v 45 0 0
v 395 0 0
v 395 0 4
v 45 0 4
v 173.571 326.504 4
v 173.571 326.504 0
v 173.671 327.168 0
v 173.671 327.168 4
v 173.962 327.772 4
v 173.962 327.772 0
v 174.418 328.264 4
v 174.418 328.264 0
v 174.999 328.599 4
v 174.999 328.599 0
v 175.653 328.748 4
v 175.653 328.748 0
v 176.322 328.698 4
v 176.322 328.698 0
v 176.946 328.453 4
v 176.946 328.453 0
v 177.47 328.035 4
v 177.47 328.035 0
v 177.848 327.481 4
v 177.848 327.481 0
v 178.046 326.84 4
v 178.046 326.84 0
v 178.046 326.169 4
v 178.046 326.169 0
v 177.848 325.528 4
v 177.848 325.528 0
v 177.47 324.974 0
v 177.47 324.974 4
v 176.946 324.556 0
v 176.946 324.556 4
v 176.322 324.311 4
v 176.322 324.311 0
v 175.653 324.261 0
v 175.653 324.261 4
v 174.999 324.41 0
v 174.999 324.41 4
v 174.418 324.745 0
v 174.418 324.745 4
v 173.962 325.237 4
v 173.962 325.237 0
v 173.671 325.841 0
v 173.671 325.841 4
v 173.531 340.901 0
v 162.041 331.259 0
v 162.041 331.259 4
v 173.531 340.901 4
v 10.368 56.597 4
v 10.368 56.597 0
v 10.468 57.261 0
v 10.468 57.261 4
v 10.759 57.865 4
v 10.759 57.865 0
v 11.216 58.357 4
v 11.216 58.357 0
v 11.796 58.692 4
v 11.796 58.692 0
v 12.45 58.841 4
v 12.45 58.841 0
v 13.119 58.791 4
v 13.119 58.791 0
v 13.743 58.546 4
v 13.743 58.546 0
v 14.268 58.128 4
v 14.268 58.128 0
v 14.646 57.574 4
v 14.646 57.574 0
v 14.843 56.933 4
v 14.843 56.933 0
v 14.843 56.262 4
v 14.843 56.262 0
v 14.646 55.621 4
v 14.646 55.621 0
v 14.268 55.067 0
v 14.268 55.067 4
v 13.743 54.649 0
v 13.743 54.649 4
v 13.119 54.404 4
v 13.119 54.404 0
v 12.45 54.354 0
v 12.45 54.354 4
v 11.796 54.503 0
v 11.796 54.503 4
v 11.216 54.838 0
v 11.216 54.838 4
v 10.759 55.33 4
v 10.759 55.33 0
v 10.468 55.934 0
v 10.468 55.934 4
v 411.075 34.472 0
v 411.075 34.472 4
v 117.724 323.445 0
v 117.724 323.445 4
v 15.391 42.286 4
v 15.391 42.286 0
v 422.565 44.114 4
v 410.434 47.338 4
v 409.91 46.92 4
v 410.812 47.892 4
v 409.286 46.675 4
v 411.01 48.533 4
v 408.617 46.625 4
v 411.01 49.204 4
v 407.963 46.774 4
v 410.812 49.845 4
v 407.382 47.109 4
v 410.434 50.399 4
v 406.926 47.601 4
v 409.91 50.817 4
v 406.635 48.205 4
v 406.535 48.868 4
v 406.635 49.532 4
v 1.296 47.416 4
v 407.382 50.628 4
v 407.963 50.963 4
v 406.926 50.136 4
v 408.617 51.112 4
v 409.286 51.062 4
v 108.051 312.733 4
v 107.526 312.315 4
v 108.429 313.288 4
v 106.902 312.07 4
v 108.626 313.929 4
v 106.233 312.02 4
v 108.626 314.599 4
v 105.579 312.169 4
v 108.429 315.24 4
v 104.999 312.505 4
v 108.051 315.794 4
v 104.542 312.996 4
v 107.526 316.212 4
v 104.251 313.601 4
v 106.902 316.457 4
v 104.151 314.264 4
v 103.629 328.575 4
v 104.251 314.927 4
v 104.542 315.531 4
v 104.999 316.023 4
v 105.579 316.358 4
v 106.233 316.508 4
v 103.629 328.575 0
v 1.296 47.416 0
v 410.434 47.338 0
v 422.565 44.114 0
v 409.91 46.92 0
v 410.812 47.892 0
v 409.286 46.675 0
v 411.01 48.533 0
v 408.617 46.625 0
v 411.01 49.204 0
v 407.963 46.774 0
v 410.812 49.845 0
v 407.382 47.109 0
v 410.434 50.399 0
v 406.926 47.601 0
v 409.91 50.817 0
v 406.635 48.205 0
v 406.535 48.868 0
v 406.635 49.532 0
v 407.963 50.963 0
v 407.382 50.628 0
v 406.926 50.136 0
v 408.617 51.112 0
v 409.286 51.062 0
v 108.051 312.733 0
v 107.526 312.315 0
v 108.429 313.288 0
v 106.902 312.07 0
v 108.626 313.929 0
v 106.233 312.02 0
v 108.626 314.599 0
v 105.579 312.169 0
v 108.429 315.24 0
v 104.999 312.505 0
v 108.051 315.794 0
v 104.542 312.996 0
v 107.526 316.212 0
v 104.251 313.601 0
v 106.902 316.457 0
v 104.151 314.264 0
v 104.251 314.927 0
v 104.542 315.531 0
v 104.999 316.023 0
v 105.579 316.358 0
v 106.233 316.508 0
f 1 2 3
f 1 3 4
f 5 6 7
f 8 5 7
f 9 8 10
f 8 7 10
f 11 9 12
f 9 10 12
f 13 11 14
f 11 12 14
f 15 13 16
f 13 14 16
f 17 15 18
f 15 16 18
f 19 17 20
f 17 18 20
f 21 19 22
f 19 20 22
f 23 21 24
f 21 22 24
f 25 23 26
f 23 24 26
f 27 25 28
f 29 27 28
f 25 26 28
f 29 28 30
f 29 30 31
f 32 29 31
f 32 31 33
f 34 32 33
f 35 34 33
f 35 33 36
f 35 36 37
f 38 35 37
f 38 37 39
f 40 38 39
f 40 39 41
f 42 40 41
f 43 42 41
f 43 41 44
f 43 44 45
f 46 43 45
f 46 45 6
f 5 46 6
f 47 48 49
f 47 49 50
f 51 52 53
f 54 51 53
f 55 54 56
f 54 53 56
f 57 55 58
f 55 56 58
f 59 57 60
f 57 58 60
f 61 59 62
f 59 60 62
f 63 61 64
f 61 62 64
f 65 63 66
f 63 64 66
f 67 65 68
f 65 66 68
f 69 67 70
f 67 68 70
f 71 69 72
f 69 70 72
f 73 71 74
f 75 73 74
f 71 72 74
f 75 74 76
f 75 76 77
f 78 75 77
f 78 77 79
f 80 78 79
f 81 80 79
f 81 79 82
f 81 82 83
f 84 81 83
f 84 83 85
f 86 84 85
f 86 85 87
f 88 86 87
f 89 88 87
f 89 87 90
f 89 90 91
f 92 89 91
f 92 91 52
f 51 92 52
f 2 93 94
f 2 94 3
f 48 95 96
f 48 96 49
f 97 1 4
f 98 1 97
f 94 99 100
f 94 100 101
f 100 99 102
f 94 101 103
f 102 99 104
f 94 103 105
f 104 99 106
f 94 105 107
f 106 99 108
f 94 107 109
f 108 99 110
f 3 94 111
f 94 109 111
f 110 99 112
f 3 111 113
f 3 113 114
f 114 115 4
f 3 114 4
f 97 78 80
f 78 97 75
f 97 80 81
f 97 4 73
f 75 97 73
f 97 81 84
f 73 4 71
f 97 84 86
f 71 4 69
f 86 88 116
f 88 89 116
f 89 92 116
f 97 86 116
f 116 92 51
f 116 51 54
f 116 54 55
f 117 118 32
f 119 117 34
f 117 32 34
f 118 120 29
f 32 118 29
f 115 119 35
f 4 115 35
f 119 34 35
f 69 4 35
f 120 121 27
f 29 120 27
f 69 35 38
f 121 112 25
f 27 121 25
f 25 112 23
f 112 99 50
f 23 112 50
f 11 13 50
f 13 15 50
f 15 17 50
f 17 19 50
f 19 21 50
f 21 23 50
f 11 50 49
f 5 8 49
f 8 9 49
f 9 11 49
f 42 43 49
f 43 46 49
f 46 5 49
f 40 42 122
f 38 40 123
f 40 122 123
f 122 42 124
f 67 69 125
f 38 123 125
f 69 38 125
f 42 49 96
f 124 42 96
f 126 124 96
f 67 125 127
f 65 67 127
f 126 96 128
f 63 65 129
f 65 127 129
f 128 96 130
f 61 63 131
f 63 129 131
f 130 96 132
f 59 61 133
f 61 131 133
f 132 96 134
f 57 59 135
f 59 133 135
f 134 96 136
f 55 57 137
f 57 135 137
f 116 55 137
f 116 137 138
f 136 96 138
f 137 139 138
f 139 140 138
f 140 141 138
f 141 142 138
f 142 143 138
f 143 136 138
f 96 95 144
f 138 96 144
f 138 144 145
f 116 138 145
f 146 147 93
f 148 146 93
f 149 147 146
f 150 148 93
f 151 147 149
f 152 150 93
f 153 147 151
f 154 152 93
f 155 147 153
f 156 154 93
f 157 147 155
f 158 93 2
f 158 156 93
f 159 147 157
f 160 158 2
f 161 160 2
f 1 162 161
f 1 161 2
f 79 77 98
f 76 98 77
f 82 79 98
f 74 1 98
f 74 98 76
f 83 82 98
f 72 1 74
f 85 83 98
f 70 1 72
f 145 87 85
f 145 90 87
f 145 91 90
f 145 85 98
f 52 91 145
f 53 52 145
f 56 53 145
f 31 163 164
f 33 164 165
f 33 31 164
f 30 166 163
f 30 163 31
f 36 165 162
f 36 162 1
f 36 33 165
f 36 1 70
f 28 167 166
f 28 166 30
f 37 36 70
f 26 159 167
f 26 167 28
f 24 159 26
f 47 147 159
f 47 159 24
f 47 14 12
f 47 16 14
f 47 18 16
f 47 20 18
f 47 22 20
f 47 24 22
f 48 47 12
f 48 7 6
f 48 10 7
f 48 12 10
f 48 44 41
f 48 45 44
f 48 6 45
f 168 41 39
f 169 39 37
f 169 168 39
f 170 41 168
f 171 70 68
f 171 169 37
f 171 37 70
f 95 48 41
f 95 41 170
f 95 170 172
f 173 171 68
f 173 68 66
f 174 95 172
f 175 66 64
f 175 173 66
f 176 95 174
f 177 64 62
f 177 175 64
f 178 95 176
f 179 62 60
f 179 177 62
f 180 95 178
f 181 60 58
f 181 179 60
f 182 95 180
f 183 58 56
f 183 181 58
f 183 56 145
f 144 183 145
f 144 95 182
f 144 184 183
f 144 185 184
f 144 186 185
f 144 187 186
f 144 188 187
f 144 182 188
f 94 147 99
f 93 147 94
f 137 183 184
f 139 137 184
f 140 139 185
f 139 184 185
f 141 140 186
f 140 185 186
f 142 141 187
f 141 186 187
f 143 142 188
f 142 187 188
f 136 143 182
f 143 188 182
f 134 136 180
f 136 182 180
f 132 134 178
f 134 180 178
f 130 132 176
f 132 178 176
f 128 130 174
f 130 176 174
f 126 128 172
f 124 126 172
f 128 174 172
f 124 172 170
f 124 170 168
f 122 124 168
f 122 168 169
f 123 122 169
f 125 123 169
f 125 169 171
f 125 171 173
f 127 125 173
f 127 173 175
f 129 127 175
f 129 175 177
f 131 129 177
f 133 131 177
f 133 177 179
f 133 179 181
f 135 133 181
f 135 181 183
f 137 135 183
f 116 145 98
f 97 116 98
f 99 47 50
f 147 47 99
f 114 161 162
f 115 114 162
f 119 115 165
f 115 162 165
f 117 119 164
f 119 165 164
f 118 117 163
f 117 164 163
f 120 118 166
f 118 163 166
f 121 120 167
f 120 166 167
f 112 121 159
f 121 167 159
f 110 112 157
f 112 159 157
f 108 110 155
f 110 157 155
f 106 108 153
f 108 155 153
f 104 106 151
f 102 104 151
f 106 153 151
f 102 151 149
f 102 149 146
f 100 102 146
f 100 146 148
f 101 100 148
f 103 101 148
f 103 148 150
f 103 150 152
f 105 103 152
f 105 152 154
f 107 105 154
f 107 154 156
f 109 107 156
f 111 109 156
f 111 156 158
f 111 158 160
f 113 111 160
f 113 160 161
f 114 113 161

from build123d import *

# Parameters (mm, degrees)
EXTRUDE_1_DEPTH    = 4
HOLE_WIZARD_M4_1_D = 4.5


with BuildPart() as part:
    # ｽｹｯﾁ1 → ﾎﾞｽ - 押し出し1 (new body)
    with BuildSketch(Plane.XY):
        Polygon((162.040656836, 331.259045811), (411.074557564, 34.47199994), (395, 0), (45, 0), (15.39090645, 42.286167935), (117.724307951, 323.444877815), align=None)
        Polygon((117.724307951, 323.444877815), (103.628918639, 328.575179965), (1.295517138, 47.416470085), (15.39090645, 42.286167935), align=None)
        Polygon((173.531323483, 340.900859956), (422.565224211, 44.113814086), (411.074557564, 34.47199994), (162.040656836, 331.259045811), align=None)
    extrude(amount=EXTRUDE_1_DEPTH)

    # M4 すきま穴1 (through all)
    with Locations(Plane.XY.offset(4)):
        with Locations((106.401361503, 314.263871131), (12.618463585, 56.59747677), (175.820835281, 326.504397344), (408.785045766, 48.868462552)):
            Hole(HOLE_WIZARD_M4_1_D / 2)


solid = part.part
